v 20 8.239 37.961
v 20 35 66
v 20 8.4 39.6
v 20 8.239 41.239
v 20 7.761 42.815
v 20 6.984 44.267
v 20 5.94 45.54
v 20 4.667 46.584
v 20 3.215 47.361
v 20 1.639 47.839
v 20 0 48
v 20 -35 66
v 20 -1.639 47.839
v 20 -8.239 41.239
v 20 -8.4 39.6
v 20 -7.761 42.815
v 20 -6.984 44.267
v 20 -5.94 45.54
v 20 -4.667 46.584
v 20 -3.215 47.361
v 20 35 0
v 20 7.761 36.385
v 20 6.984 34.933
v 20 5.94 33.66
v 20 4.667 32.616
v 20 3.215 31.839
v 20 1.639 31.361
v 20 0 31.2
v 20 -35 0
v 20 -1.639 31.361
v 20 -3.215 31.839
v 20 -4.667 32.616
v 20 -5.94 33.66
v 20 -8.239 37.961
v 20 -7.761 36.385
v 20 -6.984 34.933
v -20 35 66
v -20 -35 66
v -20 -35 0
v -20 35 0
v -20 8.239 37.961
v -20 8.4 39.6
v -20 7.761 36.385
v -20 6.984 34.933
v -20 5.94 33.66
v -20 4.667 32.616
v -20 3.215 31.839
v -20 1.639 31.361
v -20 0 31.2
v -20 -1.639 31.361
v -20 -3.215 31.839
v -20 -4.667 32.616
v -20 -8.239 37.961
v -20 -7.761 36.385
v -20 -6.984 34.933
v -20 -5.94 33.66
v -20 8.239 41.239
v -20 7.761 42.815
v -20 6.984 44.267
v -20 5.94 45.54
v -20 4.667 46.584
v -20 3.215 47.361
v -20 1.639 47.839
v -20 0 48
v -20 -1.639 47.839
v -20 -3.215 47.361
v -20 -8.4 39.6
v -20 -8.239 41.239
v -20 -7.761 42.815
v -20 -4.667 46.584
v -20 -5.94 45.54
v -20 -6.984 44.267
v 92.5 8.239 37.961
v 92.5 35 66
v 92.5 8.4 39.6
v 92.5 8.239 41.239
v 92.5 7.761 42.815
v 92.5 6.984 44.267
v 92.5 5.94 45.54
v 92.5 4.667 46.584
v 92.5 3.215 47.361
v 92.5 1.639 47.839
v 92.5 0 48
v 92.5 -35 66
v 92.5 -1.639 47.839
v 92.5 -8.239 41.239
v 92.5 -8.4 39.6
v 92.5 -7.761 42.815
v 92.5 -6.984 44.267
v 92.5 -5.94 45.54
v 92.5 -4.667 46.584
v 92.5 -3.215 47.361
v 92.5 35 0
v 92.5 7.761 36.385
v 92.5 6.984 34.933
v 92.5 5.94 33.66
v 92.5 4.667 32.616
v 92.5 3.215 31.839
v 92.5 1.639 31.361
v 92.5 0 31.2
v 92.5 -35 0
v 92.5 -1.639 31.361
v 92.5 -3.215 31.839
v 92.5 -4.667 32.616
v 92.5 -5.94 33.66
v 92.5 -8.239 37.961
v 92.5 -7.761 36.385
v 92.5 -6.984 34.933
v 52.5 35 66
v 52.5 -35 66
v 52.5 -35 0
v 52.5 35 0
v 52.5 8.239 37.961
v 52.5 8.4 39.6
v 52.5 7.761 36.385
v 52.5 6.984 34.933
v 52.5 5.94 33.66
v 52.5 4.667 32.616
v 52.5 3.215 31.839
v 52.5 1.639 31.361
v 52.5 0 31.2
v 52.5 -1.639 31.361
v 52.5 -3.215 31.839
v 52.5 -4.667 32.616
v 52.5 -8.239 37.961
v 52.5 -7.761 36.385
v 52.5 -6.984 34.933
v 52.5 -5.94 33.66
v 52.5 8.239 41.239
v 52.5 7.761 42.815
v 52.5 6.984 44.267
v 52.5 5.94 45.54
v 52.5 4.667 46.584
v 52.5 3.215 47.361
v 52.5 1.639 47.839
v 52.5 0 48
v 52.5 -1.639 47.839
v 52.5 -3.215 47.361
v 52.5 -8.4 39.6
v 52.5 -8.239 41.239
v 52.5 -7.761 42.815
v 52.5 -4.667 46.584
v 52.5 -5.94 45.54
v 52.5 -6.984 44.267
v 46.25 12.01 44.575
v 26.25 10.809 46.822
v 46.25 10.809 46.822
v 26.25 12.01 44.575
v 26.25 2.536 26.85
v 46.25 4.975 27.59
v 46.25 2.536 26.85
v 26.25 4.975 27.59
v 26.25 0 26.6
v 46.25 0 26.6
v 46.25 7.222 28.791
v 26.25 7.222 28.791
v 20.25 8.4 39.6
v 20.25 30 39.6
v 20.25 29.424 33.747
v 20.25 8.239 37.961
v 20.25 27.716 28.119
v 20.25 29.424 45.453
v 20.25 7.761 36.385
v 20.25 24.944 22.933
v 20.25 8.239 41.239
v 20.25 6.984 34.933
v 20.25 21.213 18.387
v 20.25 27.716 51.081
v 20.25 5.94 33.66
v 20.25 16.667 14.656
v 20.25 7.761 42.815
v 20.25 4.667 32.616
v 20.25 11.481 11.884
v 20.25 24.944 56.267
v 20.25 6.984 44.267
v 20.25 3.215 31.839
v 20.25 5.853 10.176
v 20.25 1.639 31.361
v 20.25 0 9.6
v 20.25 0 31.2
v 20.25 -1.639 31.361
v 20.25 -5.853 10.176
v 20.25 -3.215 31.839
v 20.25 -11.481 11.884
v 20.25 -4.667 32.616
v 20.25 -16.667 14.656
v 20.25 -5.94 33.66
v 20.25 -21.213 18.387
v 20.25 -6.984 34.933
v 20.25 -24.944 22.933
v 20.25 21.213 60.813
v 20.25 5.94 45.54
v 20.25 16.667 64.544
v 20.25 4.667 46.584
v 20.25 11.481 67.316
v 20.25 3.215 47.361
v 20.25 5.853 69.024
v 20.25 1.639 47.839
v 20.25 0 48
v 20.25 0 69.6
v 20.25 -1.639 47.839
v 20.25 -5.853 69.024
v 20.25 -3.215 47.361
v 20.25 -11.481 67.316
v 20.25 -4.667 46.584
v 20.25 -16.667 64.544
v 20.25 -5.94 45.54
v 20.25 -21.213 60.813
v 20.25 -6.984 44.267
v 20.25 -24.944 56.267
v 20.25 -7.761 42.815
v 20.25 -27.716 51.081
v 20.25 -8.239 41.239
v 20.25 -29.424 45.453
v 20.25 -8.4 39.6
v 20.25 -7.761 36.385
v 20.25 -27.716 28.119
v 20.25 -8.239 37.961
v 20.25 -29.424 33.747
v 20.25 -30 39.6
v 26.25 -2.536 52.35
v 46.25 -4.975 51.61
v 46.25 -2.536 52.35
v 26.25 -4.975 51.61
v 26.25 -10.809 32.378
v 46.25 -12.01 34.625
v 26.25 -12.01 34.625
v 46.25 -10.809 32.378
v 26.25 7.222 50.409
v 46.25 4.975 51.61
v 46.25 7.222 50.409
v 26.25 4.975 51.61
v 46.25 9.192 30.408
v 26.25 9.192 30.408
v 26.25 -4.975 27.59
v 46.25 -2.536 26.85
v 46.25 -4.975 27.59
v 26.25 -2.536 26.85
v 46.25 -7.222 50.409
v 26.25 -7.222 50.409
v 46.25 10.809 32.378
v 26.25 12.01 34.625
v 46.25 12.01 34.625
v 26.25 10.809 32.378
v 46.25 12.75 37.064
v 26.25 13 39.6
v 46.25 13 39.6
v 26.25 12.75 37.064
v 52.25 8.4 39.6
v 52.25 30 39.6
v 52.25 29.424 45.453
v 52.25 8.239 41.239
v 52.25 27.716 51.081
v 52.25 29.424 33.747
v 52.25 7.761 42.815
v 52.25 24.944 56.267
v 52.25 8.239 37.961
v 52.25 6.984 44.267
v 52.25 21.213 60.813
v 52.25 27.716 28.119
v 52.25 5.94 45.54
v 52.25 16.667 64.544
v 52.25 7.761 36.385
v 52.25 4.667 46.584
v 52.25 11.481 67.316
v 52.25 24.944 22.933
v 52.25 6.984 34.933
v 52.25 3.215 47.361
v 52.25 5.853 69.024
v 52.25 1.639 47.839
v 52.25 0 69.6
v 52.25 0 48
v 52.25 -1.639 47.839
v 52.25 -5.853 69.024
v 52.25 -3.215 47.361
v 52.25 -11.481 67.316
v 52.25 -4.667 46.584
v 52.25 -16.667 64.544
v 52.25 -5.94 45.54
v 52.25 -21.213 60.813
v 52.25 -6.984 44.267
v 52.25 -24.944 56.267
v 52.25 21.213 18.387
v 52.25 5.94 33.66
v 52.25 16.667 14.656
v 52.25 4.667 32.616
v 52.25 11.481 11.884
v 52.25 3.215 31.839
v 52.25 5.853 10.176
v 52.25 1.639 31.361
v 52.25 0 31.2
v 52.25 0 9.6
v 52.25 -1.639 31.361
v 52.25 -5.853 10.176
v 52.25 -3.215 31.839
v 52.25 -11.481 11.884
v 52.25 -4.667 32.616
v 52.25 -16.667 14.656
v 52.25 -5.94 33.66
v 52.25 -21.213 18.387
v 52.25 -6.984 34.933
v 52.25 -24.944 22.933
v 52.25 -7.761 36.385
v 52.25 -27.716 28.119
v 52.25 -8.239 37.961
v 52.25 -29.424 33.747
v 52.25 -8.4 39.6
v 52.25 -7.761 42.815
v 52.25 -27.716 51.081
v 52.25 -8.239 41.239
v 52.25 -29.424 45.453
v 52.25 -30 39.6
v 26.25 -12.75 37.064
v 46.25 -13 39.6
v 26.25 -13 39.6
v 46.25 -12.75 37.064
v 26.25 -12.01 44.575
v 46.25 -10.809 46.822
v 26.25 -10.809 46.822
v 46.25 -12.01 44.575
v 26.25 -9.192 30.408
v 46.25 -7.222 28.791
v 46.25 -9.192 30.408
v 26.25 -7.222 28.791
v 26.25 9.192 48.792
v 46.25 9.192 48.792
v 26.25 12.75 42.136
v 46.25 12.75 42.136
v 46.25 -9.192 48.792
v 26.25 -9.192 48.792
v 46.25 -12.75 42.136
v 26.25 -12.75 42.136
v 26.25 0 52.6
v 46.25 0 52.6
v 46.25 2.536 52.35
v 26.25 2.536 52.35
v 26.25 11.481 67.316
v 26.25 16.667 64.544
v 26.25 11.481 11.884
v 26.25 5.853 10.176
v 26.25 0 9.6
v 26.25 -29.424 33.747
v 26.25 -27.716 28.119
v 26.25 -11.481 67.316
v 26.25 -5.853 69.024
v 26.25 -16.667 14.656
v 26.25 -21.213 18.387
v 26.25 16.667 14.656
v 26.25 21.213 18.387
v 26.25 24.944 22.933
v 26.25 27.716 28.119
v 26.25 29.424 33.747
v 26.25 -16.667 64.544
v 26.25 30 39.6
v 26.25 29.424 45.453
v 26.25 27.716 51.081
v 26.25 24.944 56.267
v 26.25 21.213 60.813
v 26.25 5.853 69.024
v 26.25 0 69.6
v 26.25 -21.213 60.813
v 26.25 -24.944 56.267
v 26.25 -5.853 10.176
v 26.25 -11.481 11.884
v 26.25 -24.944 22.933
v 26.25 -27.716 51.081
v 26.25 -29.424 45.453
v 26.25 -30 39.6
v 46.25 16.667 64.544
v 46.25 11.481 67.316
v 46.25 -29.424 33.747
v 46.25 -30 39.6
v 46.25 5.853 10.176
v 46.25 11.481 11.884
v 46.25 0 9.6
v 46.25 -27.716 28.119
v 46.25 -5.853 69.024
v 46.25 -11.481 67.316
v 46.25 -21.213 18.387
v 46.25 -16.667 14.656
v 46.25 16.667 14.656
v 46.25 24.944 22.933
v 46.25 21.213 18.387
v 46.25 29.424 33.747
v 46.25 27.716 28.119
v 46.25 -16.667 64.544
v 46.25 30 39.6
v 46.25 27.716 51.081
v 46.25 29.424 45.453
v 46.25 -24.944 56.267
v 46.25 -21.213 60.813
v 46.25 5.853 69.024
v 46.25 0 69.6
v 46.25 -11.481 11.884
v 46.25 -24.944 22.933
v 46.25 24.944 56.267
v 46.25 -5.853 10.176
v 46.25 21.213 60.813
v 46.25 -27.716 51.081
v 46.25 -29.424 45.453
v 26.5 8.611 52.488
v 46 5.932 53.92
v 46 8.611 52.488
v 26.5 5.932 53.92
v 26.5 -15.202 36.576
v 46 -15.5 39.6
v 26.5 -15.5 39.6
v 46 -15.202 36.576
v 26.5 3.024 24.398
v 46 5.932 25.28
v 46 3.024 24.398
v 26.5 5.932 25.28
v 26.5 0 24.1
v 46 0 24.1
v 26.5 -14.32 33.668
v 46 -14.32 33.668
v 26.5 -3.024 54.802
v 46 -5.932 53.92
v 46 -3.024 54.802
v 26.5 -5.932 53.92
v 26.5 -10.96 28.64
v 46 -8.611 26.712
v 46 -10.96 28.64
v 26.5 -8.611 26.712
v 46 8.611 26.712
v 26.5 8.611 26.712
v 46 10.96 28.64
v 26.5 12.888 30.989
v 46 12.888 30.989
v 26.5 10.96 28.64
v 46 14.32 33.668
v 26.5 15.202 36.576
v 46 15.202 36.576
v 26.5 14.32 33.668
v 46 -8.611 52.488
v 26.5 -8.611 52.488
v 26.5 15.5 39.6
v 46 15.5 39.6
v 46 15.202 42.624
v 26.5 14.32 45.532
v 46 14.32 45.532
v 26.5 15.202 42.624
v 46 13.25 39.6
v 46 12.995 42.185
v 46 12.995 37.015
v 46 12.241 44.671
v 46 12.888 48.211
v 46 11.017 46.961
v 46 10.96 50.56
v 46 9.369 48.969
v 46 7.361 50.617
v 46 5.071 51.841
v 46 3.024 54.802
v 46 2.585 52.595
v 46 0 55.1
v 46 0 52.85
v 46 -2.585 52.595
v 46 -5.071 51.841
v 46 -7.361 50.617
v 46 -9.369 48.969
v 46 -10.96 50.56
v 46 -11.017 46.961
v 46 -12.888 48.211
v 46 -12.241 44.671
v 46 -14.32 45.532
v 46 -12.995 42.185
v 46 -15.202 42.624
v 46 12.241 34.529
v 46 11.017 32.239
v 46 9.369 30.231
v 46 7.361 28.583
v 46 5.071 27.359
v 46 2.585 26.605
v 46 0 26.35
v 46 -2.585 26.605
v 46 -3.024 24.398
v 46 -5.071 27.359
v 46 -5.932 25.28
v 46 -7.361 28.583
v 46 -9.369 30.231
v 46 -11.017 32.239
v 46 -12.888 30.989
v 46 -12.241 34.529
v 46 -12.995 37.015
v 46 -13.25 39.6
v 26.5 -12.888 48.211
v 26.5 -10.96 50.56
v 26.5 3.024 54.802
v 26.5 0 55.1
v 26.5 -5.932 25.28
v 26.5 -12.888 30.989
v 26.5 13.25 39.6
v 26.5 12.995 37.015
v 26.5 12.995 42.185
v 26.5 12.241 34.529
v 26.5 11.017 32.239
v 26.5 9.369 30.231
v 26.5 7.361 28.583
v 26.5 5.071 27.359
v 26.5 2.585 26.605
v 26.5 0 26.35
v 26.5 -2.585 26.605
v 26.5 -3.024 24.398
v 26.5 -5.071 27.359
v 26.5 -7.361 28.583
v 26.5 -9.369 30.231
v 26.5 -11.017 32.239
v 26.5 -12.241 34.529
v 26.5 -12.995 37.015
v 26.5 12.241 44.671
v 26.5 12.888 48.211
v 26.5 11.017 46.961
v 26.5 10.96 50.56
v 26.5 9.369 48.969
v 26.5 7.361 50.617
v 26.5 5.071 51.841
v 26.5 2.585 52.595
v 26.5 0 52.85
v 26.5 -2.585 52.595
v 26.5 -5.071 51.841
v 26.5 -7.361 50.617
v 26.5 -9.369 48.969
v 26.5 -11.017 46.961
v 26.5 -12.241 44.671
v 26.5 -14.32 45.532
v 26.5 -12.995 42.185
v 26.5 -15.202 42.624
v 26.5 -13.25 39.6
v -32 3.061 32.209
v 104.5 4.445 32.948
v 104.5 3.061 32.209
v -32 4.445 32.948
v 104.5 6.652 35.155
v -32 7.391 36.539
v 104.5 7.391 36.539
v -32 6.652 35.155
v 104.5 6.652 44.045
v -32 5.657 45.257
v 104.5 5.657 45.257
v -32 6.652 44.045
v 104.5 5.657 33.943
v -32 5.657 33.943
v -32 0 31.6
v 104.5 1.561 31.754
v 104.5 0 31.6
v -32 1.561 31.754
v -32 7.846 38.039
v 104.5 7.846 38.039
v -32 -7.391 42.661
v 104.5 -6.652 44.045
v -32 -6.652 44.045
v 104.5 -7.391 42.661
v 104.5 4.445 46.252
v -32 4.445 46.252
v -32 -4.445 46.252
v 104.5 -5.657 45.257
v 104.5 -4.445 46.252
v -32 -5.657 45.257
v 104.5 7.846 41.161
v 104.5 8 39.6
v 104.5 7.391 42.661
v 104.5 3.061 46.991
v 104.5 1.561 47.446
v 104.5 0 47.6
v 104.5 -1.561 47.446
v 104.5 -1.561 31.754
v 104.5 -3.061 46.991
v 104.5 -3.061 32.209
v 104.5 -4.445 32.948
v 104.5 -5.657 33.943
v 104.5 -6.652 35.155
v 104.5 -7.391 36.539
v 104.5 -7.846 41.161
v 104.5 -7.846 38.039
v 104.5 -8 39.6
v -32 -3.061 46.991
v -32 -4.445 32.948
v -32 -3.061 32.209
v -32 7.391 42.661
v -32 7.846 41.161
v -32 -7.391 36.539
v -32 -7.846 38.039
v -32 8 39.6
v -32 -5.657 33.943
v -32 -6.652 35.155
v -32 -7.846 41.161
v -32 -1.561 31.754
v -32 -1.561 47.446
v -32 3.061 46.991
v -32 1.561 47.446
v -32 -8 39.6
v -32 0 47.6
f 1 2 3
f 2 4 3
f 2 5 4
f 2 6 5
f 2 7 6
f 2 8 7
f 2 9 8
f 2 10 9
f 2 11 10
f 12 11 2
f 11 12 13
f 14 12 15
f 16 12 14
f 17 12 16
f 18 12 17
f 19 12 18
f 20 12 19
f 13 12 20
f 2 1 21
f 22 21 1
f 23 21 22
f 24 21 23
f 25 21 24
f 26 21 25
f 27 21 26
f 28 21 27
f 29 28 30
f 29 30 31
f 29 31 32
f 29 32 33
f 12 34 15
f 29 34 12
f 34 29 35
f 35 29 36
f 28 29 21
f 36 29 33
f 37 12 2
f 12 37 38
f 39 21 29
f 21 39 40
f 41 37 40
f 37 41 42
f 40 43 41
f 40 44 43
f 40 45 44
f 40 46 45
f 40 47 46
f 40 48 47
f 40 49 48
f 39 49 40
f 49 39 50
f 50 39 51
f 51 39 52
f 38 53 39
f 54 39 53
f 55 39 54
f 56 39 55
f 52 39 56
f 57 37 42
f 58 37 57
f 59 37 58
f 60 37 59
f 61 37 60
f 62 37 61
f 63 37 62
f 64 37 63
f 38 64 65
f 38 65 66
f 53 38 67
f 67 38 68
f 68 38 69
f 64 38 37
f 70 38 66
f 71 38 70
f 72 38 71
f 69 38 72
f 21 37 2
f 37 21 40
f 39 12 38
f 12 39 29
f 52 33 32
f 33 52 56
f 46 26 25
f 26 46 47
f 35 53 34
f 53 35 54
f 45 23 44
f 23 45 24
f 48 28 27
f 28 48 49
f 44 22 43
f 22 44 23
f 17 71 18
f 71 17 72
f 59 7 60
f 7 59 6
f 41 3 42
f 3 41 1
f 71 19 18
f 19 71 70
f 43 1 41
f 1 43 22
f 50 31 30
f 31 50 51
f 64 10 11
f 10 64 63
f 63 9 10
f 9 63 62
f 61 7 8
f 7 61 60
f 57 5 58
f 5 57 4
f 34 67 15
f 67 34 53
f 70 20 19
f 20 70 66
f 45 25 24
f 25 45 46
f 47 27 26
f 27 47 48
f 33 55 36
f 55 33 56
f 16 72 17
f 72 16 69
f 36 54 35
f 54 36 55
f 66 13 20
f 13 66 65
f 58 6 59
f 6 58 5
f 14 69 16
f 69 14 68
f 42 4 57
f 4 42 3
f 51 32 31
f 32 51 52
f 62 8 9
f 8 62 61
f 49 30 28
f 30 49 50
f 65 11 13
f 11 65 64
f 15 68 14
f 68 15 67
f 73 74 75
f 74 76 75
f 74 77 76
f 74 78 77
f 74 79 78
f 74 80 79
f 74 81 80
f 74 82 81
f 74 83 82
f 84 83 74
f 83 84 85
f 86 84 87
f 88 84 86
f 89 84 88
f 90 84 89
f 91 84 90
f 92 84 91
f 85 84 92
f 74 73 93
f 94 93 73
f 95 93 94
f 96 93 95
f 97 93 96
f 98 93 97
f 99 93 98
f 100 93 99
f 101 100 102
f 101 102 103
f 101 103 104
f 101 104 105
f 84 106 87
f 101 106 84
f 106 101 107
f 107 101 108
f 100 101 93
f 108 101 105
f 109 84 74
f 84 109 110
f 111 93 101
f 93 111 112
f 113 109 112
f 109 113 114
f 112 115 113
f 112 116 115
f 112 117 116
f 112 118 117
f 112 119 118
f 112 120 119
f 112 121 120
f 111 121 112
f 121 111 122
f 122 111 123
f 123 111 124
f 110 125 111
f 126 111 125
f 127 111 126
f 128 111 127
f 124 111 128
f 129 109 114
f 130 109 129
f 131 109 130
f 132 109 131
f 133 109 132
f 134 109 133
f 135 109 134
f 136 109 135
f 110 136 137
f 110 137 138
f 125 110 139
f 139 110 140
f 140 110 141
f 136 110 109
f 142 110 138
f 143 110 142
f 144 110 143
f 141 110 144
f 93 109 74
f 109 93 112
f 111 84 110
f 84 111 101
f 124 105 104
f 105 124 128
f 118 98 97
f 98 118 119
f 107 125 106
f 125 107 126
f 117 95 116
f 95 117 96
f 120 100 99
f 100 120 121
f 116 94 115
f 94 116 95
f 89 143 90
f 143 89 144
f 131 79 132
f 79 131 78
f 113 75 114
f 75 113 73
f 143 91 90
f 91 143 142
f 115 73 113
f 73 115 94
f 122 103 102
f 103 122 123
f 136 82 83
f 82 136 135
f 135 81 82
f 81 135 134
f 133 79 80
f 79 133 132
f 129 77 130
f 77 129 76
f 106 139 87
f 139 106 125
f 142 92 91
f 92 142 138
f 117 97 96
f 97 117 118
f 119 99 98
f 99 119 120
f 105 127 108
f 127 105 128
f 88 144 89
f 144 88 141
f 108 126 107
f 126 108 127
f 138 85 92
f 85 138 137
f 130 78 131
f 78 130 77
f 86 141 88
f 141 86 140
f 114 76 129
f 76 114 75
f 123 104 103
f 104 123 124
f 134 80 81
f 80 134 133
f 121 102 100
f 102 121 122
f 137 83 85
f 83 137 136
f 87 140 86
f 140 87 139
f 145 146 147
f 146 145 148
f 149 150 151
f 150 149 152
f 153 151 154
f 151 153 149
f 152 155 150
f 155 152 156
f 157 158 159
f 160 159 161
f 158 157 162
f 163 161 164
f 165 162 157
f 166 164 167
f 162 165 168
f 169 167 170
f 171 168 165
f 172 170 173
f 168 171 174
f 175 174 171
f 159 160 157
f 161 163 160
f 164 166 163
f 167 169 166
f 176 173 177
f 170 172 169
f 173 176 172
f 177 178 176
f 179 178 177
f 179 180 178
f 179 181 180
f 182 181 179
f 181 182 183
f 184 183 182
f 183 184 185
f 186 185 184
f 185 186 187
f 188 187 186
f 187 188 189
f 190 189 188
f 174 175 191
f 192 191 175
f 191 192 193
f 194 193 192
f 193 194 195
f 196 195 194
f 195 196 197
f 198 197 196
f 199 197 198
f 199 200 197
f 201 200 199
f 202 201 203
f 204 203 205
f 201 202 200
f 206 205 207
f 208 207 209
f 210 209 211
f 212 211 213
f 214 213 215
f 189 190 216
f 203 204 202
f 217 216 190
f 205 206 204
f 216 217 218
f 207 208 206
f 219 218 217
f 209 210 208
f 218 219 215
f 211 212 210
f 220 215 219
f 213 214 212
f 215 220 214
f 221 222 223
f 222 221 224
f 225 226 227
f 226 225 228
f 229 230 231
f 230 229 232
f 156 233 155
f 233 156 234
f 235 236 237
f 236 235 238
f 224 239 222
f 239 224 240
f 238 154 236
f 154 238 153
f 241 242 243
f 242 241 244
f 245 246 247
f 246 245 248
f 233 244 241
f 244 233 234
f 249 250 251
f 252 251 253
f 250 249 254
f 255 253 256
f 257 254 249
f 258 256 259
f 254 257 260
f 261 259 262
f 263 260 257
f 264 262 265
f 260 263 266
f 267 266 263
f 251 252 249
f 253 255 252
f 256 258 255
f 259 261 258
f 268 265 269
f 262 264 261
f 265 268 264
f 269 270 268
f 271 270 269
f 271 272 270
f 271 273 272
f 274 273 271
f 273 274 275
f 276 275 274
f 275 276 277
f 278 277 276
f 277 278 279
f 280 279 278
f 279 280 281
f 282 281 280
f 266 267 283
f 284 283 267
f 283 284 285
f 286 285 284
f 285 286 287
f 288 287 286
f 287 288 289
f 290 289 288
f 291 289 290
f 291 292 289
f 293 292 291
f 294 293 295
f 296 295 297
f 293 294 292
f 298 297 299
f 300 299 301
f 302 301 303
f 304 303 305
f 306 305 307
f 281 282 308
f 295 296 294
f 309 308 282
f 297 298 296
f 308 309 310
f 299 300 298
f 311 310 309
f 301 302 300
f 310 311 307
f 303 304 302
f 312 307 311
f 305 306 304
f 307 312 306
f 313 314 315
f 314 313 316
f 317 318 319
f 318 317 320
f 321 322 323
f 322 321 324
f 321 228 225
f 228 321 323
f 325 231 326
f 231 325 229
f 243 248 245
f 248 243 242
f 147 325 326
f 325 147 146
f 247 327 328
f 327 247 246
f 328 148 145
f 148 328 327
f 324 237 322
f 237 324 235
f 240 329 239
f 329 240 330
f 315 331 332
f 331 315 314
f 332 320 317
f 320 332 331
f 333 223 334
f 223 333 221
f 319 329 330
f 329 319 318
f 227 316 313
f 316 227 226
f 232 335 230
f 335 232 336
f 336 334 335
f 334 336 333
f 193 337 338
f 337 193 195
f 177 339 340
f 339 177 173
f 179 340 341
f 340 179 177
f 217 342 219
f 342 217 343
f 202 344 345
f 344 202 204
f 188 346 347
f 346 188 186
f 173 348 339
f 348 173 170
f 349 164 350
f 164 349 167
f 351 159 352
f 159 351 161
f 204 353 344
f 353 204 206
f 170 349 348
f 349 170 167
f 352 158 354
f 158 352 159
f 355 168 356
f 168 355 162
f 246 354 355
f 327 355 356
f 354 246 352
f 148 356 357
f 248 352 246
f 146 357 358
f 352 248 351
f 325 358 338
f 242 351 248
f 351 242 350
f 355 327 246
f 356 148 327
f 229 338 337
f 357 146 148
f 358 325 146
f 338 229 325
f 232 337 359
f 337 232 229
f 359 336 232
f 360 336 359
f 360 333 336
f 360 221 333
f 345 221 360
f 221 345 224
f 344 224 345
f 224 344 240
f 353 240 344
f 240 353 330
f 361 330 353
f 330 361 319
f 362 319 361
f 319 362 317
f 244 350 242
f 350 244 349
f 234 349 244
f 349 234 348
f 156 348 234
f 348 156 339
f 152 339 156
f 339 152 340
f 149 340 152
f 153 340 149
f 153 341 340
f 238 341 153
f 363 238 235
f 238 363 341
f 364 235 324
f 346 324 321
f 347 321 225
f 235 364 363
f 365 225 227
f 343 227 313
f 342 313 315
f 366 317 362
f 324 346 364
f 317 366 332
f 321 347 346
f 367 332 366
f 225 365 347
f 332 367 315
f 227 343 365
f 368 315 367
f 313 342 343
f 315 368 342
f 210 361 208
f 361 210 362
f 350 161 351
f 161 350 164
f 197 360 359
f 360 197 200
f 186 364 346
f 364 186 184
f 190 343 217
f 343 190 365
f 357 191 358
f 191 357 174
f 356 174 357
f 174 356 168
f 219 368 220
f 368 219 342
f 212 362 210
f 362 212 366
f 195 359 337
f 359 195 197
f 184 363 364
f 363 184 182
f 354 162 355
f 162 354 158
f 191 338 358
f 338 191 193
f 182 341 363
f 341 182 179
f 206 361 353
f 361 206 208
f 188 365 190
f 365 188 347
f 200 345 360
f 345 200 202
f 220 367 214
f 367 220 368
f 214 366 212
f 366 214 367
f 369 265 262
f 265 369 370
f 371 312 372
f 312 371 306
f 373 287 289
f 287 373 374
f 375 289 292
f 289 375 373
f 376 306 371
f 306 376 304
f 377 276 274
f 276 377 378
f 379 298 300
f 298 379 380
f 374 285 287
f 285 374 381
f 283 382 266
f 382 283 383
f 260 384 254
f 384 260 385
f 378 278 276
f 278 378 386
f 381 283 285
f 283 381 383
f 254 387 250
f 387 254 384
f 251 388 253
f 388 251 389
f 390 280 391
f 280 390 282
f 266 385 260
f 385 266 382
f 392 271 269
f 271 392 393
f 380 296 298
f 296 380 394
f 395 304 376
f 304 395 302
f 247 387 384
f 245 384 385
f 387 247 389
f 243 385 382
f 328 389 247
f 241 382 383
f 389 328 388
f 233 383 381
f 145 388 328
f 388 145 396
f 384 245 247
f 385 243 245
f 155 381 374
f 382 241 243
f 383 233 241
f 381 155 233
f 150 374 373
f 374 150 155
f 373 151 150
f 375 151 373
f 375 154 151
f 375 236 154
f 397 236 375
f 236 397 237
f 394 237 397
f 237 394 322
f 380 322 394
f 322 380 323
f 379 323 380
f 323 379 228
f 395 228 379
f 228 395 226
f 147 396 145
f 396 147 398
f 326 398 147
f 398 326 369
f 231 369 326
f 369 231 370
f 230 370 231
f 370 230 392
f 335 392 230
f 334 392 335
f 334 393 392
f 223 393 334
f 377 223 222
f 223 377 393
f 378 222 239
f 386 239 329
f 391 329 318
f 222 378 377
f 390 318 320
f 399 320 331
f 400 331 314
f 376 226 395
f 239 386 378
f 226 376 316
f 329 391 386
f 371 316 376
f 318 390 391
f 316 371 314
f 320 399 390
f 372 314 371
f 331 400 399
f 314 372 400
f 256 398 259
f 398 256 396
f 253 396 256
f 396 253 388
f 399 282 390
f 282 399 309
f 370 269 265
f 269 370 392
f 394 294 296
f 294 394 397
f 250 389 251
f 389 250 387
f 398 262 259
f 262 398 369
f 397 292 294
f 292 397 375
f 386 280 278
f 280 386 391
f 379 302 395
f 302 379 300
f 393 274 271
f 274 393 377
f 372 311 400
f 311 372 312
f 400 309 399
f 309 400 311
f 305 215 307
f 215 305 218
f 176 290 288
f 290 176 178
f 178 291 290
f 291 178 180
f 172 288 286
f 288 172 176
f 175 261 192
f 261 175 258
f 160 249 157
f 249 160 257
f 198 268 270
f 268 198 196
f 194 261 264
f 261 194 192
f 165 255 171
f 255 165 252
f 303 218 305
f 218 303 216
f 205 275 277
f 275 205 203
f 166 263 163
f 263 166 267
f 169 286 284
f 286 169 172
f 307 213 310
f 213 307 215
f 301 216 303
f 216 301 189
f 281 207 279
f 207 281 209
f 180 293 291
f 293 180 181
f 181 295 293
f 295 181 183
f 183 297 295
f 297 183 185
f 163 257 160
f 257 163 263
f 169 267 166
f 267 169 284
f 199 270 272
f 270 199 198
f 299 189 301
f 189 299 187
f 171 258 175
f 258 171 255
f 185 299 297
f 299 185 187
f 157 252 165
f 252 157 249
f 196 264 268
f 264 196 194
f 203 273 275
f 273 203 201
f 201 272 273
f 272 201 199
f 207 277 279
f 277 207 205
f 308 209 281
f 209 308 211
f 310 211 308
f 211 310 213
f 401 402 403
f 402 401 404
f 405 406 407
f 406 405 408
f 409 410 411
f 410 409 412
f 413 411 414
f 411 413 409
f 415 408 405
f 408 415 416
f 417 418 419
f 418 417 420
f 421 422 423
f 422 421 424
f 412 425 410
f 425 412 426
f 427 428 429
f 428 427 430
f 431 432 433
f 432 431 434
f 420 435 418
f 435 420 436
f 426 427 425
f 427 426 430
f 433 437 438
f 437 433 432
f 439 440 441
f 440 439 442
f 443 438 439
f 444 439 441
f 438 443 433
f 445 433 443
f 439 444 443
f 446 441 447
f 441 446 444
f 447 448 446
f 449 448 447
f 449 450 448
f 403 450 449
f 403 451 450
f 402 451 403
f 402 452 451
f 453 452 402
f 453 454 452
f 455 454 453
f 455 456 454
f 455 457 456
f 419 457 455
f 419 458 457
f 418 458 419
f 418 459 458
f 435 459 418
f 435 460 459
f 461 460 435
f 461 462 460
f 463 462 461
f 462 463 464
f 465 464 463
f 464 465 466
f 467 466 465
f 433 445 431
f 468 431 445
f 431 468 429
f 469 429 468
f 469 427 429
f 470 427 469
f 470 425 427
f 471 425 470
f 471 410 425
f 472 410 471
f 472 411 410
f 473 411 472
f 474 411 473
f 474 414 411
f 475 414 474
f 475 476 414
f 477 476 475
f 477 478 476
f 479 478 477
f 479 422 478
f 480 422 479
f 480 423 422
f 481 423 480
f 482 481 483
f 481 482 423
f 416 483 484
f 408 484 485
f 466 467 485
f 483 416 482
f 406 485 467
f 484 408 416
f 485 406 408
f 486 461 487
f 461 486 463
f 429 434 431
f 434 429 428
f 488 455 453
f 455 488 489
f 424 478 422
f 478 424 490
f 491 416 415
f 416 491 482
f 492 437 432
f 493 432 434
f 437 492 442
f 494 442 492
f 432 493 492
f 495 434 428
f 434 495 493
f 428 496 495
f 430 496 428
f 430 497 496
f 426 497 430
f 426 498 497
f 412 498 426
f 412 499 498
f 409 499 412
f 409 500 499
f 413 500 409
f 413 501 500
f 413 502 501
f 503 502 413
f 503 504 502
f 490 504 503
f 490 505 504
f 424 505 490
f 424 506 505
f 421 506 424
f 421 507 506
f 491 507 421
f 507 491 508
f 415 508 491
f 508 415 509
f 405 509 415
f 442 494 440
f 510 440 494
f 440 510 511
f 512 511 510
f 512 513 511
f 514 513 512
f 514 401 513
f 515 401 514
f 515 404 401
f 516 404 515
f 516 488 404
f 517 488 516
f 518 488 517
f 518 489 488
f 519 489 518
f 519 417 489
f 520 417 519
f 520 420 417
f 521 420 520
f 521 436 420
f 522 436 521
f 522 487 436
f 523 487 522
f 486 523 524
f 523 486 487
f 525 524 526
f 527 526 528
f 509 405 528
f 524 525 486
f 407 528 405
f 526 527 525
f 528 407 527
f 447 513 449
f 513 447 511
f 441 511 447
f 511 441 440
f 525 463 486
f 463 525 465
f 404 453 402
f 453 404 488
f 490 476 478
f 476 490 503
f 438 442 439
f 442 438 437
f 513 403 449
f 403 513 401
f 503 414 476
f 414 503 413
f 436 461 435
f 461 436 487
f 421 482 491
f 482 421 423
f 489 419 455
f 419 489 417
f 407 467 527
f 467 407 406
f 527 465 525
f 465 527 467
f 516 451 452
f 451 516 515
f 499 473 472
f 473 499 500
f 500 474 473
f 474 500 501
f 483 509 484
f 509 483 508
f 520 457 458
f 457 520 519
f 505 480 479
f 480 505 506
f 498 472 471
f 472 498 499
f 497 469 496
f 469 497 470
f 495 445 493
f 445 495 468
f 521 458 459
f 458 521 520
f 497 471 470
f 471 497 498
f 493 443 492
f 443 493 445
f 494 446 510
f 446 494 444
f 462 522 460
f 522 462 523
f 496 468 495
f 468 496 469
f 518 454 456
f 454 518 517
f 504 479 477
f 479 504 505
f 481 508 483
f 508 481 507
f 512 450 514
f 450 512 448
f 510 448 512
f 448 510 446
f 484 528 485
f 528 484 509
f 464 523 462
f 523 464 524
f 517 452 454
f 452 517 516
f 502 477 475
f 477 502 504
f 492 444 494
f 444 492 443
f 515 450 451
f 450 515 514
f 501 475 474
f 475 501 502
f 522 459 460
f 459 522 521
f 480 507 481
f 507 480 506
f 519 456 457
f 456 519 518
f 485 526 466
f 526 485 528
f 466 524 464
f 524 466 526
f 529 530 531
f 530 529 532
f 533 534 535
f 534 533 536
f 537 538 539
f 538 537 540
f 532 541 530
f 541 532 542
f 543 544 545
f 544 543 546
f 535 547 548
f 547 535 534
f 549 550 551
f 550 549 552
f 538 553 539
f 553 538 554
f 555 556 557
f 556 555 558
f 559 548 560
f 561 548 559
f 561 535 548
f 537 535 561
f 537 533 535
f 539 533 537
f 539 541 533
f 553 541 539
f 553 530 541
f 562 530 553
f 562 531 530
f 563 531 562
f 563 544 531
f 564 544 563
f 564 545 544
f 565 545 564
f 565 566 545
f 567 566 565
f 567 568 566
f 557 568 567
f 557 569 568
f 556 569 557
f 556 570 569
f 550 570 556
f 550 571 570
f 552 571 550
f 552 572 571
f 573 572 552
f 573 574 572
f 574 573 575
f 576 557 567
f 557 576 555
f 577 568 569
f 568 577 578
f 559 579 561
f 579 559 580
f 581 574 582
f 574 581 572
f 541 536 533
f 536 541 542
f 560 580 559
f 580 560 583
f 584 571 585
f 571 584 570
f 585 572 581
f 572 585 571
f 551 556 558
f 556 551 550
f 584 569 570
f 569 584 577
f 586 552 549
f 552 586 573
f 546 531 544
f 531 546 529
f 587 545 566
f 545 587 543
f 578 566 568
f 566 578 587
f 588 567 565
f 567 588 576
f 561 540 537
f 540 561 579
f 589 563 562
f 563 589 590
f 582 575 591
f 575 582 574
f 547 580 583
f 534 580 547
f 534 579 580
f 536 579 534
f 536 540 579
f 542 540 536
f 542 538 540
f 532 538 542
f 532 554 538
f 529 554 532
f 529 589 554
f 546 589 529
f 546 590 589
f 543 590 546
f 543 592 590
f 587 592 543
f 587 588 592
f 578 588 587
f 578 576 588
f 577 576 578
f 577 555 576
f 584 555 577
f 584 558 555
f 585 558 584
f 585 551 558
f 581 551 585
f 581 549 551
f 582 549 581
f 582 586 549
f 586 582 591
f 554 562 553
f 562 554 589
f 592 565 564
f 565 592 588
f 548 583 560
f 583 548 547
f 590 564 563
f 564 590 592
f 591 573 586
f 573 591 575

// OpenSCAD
$fn = 32;

// ------------------------------------------------------------------------
// Pulley assembly: d60 pulley with a belt, shaft d16
// Every part is its own module, assembly() places them once.
// ------------------------------------------------------------------------

// --- part 1 ---
module support1() {
  difference() {
    translate([-20, -35, 0]) cube([40, 70, 66]);
    translate([0, 0, 39.6]) rotate([0, 90, 0]) cylinder(h = 42, d = 16.8, center = true);
  }
}

// --- part 2 ---
module support2() {
  difference() {
    translate([-20, -35, 0]) cube([40, 70, 66]);
    translate([0, 0, 39.6]) rotate([0, 90, 0]) cylinder(h = 42, d = 16.8, center = true);
  }
}

// --- part 3 ---
module shaft() {
  translate([0, 0, -68.25]) cylinder(h = 136.5, d = 16);
}

// --- part 4 ---
module pulley() {
  difference() {
    union() {
      cylinder(h = 32, d = 26);
      cylinder(h = 6, d = 60);
      translate([0, 0, 26]) cylinder(h = 6, d = 60);
    }
    translate([0, 0, -1]) cylinder(h = 34, d = 16.8);
  }
}

// --- part 5 ---
module belt() {
  difference() {
      translate([0, 0, 0]) cylinder(h = 19.5, d = 31);
      translate([0, 0, -1]) cylinder(h = 21.5, d = 26.5);
    }
}

// --- assembly ---
module assembly() {
  translate([0, 0, 0]) rotate([0, 0, 0]) support1();
  translate([72.5, 0, 0]) rotate([0, 0, 0]) support2();
  translate([36.25, 0, 39.6]) rotate([0, 90, 0]) shaft();
  translate([20.25, 0, 39.6]) rotate([0, 90, 0]) pulley();
  translate([26.5, 0, 39.6]) rotate([0, 90, 0]) belt();
}

assembly();
